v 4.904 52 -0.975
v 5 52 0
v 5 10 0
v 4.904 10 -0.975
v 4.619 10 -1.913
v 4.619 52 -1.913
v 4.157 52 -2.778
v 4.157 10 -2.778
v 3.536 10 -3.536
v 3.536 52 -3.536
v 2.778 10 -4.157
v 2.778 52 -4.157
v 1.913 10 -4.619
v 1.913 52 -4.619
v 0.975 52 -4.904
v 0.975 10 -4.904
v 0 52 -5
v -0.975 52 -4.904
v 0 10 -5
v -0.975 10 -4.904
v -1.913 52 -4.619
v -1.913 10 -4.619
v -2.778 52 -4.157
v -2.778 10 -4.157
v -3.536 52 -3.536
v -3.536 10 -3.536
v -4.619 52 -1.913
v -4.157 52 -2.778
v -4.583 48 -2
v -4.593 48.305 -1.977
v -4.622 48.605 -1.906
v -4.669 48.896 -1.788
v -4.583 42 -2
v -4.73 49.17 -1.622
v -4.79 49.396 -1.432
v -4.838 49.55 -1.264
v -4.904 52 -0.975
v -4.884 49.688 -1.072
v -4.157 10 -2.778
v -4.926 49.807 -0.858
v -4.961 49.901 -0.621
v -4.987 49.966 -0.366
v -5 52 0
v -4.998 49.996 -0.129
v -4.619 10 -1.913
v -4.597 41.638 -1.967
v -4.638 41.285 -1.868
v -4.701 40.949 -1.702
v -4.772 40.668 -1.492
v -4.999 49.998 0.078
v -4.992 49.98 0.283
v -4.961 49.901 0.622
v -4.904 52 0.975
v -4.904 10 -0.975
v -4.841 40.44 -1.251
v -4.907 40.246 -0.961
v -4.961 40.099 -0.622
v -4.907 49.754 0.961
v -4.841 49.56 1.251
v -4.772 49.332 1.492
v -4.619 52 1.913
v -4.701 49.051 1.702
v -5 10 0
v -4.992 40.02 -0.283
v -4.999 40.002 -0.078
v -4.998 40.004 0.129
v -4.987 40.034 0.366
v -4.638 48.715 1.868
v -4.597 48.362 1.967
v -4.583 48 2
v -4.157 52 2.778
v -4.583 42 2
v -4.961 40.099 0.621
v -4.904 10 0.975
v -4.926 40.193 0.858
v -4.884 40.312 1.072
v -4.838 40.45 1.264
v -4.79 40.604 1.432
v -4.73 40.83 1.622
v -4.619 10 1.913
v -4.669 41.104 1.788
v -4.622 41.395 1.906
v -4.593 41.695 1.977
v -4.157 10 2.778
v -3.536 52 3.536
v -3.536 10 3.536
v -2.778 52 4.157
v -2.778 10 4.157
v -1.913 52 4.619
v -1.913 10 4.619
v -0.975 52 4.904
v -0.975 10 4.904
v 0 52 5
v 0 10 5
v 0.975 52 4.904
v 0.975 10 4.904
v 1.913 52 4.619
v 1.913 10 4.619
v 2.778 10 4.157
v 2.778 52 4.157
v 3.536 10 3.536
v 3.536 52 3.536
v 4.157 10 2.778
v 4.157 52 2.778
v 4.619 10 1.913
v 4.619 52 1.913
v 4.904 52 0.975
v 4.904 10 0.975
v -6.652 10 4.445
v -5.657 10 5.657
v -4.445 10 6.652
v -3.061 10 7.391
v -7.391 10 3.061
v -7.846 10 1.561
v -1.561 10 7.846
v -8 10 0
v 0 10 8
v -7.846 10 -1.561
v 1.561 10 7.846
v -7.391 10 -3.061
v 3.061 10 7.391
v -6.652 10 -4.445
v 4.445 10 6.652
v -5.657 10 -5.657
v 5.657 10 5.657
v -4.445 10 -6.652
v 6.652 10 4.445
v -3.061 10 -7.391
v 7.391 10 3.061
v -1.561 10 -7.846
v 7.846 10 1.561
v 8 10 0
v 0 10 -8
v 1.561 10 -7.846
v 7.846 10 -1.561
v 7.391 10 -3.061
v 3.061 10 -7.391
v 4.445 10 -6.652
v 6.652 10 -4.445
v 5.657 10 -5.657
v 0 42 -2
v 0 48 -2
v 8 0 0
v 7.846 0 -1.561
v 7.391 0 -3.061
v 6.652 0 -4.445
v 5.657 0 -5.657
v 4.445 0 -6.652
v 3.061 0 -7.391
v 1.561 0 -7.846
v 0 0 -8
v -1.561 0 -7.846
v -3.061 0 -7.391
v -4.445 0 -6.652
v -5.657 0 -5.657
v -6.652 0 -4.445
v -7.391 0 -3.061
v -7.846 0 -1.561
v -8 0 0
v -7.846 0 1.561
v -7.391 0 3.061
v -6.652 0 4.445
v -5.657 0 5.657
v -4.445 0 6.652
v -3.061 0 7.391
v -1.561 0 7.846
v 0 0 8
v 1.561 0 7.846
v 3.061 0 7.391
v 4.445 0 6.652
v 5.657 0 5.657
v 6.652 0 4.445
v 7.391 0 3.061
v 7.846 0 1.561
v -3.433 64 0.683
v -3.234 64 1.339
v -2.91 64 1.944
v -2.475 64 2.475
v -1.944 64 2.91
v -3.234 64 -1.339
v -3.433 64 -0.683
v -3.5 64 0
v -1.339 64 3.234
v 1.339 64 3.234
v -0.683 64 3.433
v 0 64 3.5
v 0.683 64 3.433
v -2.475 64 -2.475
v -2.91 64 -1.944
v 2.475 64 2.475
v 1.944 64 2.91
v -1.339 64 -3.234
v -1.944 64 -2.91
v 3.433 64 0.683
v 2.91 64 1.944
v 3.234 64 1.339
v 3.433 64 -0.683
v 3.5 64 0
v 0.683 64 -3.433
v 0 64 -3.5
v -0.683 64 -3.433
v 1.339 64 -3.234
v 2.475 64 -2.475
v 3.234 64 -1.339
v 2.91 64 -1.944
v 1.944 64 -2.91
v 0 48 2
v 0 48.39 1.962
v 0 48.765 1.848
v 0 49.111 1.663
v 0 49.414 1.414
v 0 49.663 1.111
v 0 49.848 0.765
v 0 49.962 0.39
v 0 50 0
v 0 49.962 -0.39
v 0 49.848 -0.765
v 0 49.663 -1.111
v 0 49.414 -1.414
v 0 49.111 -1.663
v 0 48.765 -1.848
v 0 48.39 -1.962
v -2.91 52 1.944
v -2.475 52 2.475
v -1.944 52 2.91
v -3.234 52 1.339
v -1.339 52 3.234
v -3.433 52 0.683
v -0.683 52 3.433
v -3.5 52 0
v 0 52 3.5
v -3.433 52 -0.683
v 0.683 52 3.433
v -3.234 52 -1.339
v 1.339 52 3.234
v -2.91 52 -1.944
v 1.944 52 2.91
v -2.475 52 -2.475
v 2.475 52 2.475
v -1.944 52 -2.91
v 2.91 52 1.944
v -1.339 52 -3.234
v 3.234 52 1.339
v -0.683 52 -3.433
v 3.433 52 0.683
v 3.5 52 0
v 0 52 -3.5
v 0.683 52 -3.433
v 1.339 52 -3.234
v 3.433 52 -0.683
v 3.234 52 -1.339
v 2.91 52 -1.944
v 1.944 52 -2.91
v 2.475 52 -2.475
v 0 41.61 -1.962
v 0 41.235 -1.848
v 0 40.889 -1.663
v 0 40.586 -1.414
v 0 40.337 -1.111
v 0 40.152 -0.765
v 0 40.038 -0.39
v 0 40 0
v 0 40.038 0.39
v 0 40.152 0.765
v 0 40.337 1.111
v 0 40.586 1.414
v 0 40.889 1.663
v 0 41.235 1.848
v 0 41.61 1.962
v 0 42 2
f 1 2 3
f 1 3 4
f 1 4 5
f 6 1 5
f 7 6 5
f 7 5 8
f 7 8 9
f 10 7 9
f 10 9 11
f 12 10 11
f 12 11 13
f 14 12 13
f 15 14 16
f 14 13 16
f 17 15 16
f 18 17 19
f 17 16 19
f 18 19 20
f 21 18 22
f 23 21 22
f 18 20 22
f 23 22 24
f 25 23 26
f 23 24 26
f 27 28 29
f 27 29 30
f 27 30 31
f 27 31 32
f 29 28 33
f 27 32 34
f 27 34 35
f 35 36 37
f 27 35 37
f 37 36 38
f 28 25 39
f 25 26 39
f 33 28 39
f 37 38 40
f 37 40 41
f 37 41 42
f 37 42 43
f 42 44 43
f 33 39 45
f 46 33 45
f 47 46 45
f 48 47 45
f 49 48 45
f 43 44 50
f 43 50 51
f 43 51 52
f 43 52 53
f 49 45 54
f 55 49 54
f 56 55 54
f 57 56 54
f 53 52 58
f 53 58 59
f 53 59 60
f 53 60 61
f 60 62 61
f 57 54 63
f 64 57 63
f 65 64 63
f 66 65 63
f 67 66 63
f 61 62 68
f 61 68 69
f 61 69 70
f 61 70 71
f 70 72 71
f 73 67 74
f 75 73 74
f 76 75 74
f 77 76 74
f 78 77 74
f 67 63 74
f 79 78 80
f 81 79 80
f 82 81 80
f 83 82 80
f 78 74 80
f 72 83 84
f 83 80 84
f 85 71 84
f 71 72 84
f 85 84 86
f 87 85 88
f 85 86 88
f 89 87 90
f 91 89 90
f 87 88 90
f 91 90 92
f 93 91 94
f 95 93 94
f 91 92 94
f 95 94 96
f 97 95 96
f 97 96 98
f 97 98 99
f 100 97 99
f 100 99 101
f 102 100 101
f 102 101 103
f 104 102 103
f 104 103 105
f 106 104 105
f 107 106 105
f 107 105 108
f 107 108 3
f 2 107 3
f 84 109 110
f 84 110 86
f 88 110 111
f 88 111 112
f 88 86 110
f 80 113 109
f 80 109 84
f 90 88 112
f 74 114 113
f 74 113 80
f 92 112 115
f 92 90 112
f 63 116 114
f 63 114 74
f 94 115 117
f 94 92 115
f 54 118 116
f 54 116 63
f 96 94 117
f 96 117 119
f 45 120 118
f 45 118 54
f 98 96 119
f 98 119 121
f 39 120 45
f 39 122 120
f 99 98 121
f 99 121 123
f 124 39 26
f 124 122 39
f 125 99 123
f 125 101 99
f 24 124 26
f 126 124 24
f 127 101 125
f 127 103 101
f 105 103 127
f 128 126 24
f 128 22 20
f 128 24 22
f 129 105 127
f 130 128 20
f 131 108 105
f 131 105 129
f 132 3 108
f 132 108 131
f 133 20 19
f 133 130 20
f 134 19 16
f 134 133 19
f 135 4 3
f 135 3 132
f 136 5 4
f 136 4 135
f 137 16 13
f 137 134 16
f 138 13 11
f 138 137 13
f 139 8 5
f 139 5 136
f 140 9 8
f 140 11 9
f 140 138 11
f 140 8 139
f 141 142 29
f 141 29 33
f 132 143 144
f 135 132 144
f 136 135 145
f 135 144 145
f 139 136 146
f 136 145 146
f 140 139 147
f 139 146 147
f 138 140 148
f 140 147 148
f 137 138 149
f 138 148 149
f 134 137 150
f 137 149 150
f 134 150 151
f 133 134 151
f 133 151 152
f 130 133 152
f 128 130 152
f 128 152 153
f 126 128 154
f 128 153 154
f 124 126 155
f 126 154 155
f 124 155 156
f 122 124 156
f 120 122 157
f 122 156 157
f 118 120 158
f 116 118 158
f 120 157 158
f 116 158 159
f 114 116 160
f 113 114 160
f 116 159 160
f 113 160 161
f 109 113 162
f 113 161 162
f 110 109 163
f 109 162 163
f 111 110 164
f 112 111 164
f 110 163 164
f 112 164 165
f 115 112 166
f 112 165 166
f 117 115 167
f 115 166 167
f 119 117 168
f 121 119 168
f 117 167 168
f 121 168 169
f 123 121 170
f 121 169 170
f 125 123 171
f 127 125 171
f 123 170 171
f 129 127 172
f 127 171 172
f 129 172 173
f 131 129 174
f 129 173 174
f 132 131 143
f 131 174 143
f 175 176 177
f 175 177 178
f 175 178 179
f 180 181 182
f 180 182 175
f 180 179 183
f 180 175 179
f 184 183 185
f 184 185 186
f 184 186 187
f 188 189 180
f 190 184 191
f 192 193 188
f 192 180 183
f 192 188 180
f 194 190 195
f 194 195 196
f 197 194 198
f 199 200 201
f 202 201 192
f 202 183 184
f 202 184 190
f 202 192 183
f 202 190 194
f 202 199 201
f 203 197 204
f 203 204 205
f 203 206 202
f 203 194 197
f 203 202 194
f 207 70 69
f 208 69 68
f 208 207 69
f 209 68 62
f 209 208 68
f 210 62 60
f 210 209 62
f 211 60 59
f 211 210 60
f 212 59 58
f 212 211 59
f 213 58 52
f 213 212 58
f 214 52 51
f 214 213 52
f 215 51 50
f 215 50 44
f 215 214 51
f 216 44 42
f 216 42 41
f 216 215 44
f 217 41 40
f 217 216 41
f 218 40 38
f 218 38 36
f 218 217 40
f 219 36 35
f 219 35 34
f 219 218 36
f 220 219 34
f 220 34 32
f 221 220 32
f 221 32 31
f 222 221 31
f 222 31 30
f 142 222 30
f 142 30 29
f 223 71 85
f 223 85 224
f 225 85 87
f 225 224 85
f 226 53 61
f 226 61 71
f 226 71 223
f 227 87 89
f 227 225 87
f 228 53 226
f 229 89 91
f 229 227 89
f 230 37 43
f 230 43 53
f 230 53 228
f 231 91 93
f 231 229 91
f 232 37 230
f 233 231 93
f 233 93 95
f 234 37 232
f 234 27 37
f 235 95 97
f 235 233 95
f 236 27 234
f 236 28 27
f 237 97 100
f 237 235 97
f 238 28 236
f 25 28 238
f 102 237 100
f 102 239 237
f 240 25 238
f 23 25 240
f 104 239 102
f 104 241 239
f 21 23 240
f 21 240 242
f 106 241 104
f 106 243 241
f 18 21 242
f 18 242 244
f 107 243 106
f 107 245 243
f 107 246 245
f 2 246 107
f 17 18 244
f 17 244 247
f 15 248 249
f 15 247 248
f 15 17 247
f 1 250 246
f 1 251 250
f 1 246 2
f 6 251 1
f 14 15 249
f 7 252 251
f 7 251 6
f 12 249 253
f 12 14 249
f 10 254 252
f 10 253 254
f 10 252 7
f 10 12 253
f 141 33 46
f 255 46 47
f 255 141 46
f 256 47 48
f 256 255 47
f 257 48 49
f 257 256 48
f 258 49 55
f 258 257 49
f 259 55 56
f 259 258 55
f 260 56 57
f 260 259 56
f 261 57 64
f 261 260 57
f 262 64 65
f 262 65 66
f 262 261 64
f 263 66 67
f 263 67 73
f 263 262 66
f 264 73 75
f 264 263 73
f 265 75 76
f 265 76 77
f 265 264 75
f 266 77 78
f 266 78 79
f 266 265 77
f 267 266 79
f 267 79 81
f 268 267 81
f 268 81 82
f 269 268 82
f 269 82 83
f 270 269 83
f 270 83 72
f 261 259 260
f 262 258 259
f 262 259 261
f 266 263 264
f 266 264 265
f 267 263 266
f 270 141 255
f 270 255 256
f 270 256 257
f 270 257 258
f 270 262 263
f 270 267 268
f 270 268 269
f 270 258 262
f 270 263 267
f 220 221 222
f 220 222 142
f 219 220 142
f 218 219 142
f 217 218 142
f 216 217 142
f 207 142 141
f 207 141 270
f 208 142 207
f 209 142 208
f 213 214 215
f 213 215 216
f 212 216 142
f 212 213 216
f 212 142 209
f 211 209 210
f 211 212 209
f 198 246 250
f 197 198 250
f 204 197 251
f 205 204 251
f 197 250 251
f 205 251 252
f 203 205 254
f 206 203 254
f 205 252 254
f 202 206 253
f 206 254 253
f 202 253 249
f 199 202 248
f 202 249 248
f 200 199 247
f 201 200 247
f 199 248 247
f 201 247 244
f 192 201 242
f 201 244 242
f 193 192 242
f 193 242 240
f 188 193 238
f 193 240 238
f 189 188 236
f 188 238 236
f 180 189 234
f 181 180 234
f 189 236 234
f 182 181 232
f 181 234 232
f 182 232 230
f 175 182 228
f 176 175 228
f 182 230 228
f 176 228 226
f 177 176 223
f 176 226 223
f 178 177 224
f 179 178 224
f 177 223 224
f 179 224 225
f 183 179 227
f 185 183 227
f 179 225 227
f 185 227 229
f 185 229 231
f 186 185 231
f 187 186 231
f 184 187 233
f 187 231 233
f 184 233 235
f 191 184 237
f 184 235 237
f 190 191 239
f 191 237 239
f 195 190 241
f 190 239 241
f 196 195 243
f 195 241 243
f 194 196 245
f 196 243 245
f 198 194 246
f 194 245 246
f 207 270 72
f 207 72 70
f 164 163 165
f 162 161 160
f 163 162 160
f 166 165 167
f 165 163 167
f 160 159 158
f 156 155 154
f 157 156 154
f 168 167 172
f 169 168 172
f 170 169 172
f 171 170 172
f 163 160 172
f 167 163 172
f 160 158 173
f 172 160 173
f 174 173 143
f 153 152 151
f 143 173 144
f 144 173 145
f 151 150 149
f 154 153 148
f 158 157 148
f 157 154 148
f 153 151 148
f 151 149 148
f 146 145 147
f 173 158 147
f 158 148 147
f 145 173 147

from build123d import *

# Parameters (mm, degrees)
SKETCH_1_R          = 8
EXTRUDE_1_DEPTH     = 10
SKETCH_2_R          = 5
EXTRUDE_2_DEPTH     = 42
SKETCH_3_R          = 3.5
EXTRUDE_3_DEPTH     = 12
CUT_EXTRUDE_1_DEPTH = 10


with BuildPart() as part:
    # Эскиз1 → Бобышка-Вытянуть1 (new body)
    with BuildSketch(Plane(origin=(0, 0, 0), x_dir=(1, 0, 0), z_dir=(0, 1, 0))):
        Circle(SKETCH_1_R)
    extrude(amount=EXTRUDE_1_DEPTH)

    # Эскиз2 → Бобышка-Вытянуть2 (add)
    with BuildSketch(Plane(origin=(0, 10, 0), x_dir=(1, 0, 0), z_dir=(0, 1, 0))):
        Circle(SKETCH_2_R)
    extrude(amount=EXTRUDE_2_DEPTH)

    # Эскиз3 → Бобышка-Вытянуть3 (add)
    with BuildSketch(Plane(origin=(0, 52, 0), x_dir=(1, 0, 0), z_dir=(0, 1, 0))):
        Circle(SKETCH_3_R)
    extrude(amount=EXTRUDE_3_DEPTH)

    # Эскиз4 → Вырез-Вытянуть1 (cut)
    with BuildSketch(Plane(origin=(0, 0, 0), x_dir=(0, 0, -1), z_dir=(1, 0, 0))):
        with BuildLine():
            Line((-2, 42), (-2, 48))
            ThreePointArc((-2, 48), (0, 50), (2, 48))
            Line((2, 48), (2, 42))
            ThreePointArc((2, 42), (0, 40), (-2, 42))
        make_face()
    extrude(amount=-CUT_EXTRUDE_1_DEPTH, mode=Mode.SUBTRACT)


solid = part.part
